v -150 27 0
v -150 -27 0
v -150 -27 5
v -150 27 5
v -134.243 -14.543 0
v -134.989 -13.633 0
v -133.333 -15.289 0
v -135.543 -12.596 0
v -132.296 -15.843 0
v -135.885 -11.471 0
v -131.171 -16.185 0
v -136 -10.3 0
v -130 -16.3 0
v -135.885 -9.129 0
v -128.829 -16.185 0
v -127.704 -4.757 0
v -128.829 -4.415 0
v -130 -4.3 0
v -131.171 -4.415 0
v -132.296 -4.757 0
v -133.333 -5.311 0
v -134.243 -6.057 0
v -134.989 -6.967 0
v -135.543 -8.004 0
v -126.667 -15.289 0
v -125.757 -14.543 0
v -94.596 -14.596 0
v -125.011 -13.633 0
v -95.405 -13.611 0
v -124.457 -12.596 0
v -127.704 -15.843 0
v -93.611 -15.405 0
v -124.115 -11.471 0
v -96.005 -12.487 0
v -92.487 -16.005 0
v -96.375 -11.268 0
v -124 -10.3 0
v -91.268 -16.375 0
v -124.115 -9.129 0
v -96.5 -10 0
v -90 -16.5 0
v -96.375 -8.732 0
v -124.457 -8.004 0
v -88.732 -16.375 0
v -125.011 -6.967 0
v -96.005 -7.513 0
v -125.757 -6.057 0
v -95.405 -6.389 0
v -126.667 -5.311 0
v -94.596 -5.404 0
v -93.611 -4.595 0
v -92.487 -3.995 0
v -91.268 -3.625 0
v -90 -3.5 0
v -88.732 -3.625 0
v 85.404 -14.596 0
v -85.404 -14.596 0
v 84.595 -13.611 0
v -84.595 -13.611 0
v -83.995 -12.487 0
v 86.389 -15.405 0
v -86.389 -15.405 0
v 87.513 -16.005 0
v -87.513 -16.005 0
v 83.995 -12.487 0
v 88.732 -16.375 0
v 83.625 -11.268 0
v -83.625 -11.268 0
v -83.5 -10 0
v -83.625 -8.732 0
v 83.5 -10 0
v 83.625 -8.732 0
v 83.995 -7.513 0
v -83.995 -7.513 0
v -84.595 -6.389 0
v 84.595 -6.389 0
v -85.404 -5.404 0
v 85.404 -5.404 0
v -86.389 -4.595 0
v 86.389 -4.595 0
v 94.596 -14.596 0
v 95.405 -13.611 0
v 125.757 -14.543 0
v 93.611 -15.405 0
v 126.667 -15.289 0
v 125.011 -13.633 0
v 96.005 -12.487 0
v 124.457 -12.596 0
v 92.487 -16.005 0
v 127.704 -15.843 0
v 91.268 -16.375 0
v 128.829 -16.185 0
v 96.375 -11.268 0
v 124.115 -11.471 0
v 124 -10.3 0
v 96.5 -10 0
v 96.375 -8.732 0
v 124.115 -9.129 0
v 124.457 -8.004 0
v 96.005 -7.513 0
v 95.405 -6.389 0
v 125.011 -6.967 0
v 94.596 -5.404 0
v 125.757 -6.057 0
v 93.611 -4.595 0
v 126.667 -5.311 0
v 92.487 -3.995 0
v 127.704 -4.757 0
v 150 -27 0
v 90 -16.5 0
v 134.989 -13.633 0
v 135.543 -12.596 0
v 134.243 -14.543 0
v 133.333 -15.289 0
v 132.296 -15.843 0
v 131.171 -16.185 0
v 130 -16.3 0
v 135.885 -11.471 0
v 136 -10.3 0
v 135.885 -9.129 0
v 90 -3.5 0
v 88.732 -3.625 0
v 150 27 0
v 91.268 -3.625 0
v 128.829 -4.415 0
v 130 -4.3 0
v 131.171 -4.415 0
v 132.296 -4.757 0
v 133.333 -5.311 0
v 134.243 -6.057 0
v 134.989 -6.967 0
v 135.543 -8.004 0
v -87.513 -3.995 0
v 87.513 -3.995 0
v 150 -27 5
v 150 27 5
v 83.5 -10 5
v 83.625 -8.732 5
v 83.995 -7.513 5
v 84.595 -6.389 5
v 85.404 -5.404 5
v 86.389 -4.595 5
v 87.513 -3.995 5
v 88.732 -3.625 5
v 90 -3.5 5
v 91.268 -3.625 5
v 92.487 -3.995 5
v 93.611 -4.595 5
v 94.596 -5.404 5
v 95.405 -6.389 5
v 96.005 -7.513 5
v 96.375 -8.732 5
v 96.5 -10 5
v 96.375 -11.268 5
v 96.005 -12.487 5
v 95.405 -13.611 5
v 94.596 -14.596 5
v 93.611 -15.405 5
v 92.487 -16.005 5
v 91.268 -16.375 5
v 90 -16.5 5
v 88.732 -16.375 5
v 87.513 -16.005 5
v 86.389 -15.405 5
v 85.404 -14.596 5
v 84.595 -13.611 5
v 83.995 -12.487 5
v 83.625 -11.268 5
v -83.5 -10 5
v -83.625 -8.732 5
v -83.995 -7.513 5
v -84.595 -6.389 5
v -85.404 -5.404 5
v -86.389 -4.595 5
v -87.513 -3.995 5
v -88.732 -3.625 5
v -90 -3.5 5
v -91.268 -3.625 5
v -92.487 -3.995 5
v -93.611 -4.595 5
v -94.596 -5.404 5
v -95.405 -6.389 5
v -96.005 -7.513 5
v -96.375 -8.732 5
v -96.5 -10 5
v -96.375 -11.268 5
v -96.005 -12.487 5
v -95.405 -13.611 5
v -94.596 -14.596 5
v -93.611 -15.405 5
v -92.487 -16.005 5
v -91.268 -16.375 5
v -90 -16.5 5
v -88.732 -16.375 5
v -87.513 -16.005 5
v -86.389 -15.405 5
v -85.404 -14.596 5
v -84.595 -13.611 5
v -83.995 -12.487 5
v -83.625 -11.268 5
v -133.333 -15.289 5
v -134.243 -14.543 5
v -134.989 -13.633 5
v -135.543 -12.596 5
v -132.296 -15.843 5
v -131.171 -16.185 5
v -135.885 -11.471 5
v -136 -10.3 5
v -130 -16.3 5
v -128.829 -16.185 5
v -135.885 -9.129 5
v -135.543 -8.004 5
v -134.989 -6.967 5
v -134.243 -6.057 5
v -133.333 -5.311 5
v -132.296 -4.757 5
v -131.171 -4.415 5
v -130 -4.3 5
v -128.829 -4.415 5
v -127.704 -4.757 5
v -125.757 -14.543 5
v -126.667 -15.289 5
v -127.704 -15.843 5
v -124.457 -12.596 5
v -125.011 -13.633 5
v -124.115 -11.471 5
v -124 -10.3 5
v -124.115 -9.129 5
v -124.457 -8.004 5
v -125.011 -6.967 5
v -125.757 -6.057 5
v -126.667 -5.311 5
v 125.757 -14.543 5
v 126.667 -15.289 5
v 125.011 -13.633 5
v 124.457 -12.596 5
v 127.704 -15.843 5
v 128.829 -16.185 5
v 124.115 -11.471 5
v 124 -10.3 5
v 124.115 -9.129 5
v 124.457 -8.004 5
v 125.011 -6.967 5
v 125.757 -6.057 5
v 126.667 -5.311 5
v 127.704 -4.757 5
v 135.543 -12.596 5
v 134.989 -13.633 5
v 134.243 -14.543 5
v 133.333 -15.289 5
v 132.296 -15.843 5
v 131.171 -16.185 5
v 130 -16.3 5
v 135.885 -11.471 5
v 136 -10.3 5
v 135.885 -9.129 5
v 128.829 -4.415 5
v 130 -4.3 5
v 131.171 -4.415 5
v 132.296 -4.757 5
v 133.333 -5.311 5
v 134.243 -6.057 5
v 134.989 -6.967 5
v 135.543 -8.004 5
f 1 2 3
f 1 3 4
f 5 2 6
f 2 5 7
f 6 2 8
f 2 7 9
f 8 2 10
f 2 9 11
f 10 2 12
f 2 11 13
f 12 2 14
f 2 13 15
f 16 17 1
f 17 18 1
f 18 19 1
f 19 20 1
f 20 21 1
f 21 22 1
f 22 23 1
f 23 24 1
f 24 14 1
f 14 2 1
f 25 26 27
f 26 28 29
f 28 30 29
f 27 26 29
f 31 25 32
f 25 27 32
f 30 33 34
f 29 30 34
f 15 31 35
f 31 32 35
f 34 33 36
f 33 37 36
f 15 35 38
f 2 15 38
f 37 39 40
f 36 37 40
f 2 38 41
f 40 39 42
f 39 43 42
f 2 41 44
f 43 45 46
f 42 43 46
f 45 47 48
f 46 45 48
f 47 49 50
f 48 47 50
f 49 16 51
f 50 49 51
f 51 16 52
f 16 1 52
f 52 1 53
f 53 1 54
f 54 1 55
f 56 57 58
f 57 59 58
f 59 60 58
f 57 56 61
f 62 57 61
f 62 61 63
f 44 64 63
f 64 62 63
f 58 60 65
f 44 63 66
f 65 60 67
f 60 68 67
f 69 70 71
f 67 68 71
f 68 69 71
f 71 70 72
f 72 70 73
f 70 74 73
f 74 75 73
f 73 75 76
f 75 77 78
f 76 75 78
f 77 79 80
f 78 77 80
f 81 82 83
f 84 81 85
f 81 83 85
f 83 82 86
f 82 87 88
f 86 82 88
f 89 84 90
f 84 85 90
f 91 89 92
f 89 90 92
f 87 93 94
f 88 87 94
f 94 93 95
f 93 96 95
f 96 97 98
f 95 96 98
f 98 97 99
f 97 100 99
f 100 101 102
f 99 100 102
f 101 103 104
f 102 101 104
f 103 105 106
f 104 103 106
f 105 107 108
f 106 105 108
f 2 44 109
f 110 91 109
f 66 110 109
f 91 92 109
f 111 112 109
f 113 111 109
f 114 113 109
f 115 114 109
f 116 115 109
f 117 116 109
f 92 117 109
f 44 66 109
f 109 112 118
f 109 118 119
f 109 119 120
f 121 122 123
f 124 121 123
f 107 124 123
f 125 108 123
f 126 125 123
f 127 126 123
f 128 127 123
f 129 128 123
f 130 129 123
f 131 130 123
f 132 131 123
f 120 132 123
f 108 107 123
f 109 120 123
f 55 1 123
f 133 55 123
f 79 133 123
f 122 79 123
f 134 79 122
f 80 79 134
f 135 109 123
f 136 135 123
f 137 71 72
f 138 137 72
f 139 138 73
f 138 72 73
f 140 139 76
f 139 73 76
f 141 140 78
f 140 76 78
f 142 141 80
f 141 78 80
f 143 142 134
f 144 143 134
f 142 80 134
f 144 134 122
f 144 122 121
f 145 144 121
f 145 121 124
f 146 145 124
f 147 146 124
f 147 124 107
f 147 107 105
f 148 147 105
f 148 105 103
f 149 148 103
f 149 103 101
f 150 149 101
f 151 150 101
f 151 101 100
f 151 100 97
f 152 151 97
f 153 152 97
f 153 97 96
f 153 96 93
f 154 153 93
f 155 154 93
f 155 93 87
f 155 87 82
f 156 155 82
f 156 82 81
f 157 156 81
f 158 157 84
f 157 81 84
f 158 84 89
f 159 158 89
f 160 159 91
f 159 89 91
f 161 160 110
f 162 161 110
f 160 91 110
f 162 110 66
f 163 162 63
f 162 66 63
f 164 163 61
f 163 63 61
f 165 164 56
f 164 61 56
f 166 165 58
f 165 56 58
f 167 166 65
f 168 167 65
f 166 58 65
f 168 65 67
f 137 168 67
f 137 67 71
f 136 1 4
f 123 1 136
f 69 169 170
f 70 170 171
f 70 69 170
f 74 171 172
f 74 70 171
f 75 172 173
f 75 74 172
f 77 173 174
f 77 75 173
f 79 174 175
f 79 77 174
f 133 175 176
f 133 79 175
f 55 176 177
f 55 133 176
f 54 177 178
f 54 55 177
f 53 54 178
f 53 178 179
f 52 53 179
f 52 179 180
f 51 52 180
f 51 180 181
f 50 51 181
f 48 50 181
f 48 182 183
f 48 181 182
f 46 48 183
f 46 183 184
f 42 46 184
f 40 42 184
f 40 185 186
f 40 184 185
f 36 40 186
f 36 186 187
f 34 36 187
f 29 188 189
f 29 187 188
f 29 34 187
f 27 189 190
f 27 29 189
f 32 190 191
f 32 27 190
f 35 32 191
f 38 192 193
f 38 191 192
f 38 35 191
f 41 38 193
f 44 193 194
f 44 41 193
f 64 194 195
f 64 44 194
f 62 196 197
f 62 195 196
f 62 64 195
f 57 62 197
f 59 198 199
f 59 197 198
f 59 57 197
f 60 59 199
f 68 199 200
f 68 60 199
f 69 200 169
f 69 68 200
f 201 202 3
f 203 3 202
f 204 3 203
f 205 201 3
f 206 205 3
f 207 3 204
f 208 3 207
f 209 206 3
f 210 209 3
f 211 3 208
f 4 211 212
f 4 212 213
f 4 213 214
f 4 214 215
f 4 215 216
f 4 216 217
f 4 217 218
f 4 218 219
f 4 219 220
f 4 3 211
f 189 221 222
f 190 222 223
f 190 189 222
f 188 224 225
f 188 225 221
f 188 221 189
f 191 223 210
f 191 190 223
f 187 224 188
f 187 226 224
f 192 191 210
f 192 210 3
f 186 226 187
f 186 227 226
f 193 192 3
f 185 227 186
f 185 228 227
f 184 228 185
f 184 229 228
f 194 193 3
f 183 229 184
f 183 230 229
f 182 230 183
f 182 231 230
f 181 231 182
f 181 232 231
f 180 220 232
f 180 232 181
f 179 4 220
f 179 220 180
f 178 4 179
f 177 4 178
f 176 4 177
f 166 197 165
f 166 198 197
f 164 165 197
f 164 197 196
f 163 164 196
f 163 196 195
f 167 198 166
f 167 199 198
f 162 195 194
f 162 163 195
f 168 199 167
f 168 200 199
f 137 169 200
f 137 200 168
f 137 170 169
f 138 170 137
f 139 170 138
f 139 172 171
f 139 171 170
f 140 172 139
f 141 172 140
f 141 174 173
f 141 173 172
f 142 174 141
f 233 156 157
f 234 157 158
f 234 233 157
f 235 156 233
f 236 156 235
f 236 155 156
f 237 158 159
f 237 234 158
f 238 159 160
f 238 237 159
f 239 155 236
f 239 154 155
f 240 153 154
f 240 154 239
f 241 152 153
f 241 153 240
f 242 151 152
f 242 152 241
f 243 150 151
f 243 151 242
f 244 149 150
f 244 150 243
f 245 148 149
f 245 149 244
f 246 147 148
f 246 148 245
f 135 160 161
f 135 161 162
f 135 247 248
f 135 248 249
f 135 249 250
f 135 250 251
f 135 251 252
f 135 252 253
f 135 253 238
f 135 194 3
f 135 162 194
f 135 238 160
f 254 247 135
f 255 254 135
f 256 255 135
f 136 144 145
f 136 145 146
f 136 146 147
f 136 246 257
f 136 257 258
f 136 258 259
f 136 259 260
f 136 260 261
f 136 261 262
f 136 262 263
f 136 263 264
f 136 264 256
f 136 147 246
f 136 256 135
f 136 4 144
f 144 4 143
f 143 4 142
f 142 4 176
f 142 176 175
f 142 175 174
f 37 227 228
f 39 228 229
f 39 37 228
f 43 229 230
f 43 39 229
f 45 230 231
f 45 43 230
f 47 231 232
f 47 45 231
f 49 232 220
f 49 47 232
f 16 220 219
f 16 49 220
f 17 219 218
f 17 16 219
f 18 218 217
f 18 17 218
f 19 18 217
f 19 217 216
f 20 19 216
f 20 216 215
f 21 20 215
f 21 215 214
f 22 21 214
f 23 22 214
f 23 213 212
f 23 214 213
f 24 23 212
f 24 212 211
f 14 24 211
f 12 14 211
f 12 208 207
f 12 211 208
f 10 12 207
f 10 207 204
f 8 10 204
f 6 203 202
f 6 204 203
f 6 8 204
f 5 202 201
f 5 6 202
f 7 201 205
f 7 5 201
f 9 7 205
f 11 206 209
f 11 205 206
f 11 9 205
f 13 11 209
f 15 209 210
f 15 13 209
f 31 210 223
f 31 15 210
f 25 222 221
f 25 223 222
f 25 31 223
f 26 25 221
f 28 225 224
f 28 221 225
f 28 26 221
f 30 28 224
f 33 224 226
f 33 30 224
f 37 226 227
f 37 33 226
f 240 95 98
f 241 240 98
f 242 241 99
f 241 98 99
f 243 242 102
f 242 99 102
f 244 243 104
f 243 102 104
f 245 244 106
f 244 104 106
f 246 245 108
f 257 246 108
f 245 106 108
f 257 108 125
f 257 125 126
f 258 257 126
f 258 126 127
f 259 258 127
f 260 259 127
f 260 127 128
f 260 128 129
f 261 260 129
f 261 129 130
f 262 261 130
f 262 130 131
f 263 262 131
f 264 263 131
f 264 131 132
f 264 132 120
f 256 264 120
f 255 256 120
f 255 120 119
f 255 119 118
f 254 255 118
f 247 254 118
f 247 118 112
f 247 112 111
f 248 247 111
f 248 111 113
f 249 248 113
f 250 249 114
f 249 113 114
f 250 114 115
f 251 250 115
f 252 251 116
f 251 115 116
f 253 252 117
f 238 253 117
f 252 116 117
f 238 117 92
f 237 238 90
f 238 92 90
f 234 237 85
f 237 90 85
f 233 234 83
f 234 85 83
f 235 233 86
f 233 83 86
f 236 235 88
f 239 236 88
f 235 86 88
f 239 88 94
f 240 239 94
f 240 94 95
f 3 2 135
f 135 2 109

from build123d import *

# Parameters (mm, degrees)
SKETCH_1_W          = 300
SKETCH_1_H          = 54
EXTRUDE_1_DEPTH     = 5
SKETCH_2_R          = 6
CUT_EXTRUDE_1_DEPTH = 6
SKETCH_3_R          = 6.5
CUT_EXTRUDE_2_DEPTH = 10


with BuildPart() as part:
    # 草图1 → 凸台-拉伸1 (new body)
    with BuildSketch(Plane.XY):
        Rectangle(SKETCH_1_W, SKETCH_1_H)
    extrude(amount=EXTRUDE_1_DEPTH)

    # 草图2 → 切除-拉伸1 (cut, through all)
    with BuildSketch(Plane(origin=(0, 0, 0), x_dir=(-1, 0, 0), z_dir=(0, 0, -1))):
        with Locations((-130, -10.3)):
            Circle(SKETCH_2_R)
    cut_extrude_1 = extrude(amount=-CUT_EXTRUDE_1_DEPTH, mode=Mode.SUBTRACT)

    # 镜向1: 切除-拉伸1 across plane
    add(cut_extrude_1.mirror(Plane(origin=(0, 0, 0), x_dir=(0, 0, 1), z_dir=(1, 0, 0))), mode=Mode.SUBTRACT)

    # 草图3 → 切除-拉伸2 (cut)
    with BuildSketch(Plane(origin=(0, 0, 0), x_dir=(-1, 0, 0), z_dir=(0, 0, -1))):
        with Locations((-90, -10)):
            Circle(SKETCH_3_R)
    cut_extrude_2 = extrude(amount=-CUT_EXTRUDE_2_DEPTH, mode=Mode.SUBTRACT)

    # 镜向2: 切除-拉伸2 across plane
    add(cut_extrude_2.mirror(Plane(origin=(0, 0, 0), x_dir=(0, 0, 1), z_dir=(1, 0, 0))), mode=Mode.SUBTRACT)


solid = part.part
